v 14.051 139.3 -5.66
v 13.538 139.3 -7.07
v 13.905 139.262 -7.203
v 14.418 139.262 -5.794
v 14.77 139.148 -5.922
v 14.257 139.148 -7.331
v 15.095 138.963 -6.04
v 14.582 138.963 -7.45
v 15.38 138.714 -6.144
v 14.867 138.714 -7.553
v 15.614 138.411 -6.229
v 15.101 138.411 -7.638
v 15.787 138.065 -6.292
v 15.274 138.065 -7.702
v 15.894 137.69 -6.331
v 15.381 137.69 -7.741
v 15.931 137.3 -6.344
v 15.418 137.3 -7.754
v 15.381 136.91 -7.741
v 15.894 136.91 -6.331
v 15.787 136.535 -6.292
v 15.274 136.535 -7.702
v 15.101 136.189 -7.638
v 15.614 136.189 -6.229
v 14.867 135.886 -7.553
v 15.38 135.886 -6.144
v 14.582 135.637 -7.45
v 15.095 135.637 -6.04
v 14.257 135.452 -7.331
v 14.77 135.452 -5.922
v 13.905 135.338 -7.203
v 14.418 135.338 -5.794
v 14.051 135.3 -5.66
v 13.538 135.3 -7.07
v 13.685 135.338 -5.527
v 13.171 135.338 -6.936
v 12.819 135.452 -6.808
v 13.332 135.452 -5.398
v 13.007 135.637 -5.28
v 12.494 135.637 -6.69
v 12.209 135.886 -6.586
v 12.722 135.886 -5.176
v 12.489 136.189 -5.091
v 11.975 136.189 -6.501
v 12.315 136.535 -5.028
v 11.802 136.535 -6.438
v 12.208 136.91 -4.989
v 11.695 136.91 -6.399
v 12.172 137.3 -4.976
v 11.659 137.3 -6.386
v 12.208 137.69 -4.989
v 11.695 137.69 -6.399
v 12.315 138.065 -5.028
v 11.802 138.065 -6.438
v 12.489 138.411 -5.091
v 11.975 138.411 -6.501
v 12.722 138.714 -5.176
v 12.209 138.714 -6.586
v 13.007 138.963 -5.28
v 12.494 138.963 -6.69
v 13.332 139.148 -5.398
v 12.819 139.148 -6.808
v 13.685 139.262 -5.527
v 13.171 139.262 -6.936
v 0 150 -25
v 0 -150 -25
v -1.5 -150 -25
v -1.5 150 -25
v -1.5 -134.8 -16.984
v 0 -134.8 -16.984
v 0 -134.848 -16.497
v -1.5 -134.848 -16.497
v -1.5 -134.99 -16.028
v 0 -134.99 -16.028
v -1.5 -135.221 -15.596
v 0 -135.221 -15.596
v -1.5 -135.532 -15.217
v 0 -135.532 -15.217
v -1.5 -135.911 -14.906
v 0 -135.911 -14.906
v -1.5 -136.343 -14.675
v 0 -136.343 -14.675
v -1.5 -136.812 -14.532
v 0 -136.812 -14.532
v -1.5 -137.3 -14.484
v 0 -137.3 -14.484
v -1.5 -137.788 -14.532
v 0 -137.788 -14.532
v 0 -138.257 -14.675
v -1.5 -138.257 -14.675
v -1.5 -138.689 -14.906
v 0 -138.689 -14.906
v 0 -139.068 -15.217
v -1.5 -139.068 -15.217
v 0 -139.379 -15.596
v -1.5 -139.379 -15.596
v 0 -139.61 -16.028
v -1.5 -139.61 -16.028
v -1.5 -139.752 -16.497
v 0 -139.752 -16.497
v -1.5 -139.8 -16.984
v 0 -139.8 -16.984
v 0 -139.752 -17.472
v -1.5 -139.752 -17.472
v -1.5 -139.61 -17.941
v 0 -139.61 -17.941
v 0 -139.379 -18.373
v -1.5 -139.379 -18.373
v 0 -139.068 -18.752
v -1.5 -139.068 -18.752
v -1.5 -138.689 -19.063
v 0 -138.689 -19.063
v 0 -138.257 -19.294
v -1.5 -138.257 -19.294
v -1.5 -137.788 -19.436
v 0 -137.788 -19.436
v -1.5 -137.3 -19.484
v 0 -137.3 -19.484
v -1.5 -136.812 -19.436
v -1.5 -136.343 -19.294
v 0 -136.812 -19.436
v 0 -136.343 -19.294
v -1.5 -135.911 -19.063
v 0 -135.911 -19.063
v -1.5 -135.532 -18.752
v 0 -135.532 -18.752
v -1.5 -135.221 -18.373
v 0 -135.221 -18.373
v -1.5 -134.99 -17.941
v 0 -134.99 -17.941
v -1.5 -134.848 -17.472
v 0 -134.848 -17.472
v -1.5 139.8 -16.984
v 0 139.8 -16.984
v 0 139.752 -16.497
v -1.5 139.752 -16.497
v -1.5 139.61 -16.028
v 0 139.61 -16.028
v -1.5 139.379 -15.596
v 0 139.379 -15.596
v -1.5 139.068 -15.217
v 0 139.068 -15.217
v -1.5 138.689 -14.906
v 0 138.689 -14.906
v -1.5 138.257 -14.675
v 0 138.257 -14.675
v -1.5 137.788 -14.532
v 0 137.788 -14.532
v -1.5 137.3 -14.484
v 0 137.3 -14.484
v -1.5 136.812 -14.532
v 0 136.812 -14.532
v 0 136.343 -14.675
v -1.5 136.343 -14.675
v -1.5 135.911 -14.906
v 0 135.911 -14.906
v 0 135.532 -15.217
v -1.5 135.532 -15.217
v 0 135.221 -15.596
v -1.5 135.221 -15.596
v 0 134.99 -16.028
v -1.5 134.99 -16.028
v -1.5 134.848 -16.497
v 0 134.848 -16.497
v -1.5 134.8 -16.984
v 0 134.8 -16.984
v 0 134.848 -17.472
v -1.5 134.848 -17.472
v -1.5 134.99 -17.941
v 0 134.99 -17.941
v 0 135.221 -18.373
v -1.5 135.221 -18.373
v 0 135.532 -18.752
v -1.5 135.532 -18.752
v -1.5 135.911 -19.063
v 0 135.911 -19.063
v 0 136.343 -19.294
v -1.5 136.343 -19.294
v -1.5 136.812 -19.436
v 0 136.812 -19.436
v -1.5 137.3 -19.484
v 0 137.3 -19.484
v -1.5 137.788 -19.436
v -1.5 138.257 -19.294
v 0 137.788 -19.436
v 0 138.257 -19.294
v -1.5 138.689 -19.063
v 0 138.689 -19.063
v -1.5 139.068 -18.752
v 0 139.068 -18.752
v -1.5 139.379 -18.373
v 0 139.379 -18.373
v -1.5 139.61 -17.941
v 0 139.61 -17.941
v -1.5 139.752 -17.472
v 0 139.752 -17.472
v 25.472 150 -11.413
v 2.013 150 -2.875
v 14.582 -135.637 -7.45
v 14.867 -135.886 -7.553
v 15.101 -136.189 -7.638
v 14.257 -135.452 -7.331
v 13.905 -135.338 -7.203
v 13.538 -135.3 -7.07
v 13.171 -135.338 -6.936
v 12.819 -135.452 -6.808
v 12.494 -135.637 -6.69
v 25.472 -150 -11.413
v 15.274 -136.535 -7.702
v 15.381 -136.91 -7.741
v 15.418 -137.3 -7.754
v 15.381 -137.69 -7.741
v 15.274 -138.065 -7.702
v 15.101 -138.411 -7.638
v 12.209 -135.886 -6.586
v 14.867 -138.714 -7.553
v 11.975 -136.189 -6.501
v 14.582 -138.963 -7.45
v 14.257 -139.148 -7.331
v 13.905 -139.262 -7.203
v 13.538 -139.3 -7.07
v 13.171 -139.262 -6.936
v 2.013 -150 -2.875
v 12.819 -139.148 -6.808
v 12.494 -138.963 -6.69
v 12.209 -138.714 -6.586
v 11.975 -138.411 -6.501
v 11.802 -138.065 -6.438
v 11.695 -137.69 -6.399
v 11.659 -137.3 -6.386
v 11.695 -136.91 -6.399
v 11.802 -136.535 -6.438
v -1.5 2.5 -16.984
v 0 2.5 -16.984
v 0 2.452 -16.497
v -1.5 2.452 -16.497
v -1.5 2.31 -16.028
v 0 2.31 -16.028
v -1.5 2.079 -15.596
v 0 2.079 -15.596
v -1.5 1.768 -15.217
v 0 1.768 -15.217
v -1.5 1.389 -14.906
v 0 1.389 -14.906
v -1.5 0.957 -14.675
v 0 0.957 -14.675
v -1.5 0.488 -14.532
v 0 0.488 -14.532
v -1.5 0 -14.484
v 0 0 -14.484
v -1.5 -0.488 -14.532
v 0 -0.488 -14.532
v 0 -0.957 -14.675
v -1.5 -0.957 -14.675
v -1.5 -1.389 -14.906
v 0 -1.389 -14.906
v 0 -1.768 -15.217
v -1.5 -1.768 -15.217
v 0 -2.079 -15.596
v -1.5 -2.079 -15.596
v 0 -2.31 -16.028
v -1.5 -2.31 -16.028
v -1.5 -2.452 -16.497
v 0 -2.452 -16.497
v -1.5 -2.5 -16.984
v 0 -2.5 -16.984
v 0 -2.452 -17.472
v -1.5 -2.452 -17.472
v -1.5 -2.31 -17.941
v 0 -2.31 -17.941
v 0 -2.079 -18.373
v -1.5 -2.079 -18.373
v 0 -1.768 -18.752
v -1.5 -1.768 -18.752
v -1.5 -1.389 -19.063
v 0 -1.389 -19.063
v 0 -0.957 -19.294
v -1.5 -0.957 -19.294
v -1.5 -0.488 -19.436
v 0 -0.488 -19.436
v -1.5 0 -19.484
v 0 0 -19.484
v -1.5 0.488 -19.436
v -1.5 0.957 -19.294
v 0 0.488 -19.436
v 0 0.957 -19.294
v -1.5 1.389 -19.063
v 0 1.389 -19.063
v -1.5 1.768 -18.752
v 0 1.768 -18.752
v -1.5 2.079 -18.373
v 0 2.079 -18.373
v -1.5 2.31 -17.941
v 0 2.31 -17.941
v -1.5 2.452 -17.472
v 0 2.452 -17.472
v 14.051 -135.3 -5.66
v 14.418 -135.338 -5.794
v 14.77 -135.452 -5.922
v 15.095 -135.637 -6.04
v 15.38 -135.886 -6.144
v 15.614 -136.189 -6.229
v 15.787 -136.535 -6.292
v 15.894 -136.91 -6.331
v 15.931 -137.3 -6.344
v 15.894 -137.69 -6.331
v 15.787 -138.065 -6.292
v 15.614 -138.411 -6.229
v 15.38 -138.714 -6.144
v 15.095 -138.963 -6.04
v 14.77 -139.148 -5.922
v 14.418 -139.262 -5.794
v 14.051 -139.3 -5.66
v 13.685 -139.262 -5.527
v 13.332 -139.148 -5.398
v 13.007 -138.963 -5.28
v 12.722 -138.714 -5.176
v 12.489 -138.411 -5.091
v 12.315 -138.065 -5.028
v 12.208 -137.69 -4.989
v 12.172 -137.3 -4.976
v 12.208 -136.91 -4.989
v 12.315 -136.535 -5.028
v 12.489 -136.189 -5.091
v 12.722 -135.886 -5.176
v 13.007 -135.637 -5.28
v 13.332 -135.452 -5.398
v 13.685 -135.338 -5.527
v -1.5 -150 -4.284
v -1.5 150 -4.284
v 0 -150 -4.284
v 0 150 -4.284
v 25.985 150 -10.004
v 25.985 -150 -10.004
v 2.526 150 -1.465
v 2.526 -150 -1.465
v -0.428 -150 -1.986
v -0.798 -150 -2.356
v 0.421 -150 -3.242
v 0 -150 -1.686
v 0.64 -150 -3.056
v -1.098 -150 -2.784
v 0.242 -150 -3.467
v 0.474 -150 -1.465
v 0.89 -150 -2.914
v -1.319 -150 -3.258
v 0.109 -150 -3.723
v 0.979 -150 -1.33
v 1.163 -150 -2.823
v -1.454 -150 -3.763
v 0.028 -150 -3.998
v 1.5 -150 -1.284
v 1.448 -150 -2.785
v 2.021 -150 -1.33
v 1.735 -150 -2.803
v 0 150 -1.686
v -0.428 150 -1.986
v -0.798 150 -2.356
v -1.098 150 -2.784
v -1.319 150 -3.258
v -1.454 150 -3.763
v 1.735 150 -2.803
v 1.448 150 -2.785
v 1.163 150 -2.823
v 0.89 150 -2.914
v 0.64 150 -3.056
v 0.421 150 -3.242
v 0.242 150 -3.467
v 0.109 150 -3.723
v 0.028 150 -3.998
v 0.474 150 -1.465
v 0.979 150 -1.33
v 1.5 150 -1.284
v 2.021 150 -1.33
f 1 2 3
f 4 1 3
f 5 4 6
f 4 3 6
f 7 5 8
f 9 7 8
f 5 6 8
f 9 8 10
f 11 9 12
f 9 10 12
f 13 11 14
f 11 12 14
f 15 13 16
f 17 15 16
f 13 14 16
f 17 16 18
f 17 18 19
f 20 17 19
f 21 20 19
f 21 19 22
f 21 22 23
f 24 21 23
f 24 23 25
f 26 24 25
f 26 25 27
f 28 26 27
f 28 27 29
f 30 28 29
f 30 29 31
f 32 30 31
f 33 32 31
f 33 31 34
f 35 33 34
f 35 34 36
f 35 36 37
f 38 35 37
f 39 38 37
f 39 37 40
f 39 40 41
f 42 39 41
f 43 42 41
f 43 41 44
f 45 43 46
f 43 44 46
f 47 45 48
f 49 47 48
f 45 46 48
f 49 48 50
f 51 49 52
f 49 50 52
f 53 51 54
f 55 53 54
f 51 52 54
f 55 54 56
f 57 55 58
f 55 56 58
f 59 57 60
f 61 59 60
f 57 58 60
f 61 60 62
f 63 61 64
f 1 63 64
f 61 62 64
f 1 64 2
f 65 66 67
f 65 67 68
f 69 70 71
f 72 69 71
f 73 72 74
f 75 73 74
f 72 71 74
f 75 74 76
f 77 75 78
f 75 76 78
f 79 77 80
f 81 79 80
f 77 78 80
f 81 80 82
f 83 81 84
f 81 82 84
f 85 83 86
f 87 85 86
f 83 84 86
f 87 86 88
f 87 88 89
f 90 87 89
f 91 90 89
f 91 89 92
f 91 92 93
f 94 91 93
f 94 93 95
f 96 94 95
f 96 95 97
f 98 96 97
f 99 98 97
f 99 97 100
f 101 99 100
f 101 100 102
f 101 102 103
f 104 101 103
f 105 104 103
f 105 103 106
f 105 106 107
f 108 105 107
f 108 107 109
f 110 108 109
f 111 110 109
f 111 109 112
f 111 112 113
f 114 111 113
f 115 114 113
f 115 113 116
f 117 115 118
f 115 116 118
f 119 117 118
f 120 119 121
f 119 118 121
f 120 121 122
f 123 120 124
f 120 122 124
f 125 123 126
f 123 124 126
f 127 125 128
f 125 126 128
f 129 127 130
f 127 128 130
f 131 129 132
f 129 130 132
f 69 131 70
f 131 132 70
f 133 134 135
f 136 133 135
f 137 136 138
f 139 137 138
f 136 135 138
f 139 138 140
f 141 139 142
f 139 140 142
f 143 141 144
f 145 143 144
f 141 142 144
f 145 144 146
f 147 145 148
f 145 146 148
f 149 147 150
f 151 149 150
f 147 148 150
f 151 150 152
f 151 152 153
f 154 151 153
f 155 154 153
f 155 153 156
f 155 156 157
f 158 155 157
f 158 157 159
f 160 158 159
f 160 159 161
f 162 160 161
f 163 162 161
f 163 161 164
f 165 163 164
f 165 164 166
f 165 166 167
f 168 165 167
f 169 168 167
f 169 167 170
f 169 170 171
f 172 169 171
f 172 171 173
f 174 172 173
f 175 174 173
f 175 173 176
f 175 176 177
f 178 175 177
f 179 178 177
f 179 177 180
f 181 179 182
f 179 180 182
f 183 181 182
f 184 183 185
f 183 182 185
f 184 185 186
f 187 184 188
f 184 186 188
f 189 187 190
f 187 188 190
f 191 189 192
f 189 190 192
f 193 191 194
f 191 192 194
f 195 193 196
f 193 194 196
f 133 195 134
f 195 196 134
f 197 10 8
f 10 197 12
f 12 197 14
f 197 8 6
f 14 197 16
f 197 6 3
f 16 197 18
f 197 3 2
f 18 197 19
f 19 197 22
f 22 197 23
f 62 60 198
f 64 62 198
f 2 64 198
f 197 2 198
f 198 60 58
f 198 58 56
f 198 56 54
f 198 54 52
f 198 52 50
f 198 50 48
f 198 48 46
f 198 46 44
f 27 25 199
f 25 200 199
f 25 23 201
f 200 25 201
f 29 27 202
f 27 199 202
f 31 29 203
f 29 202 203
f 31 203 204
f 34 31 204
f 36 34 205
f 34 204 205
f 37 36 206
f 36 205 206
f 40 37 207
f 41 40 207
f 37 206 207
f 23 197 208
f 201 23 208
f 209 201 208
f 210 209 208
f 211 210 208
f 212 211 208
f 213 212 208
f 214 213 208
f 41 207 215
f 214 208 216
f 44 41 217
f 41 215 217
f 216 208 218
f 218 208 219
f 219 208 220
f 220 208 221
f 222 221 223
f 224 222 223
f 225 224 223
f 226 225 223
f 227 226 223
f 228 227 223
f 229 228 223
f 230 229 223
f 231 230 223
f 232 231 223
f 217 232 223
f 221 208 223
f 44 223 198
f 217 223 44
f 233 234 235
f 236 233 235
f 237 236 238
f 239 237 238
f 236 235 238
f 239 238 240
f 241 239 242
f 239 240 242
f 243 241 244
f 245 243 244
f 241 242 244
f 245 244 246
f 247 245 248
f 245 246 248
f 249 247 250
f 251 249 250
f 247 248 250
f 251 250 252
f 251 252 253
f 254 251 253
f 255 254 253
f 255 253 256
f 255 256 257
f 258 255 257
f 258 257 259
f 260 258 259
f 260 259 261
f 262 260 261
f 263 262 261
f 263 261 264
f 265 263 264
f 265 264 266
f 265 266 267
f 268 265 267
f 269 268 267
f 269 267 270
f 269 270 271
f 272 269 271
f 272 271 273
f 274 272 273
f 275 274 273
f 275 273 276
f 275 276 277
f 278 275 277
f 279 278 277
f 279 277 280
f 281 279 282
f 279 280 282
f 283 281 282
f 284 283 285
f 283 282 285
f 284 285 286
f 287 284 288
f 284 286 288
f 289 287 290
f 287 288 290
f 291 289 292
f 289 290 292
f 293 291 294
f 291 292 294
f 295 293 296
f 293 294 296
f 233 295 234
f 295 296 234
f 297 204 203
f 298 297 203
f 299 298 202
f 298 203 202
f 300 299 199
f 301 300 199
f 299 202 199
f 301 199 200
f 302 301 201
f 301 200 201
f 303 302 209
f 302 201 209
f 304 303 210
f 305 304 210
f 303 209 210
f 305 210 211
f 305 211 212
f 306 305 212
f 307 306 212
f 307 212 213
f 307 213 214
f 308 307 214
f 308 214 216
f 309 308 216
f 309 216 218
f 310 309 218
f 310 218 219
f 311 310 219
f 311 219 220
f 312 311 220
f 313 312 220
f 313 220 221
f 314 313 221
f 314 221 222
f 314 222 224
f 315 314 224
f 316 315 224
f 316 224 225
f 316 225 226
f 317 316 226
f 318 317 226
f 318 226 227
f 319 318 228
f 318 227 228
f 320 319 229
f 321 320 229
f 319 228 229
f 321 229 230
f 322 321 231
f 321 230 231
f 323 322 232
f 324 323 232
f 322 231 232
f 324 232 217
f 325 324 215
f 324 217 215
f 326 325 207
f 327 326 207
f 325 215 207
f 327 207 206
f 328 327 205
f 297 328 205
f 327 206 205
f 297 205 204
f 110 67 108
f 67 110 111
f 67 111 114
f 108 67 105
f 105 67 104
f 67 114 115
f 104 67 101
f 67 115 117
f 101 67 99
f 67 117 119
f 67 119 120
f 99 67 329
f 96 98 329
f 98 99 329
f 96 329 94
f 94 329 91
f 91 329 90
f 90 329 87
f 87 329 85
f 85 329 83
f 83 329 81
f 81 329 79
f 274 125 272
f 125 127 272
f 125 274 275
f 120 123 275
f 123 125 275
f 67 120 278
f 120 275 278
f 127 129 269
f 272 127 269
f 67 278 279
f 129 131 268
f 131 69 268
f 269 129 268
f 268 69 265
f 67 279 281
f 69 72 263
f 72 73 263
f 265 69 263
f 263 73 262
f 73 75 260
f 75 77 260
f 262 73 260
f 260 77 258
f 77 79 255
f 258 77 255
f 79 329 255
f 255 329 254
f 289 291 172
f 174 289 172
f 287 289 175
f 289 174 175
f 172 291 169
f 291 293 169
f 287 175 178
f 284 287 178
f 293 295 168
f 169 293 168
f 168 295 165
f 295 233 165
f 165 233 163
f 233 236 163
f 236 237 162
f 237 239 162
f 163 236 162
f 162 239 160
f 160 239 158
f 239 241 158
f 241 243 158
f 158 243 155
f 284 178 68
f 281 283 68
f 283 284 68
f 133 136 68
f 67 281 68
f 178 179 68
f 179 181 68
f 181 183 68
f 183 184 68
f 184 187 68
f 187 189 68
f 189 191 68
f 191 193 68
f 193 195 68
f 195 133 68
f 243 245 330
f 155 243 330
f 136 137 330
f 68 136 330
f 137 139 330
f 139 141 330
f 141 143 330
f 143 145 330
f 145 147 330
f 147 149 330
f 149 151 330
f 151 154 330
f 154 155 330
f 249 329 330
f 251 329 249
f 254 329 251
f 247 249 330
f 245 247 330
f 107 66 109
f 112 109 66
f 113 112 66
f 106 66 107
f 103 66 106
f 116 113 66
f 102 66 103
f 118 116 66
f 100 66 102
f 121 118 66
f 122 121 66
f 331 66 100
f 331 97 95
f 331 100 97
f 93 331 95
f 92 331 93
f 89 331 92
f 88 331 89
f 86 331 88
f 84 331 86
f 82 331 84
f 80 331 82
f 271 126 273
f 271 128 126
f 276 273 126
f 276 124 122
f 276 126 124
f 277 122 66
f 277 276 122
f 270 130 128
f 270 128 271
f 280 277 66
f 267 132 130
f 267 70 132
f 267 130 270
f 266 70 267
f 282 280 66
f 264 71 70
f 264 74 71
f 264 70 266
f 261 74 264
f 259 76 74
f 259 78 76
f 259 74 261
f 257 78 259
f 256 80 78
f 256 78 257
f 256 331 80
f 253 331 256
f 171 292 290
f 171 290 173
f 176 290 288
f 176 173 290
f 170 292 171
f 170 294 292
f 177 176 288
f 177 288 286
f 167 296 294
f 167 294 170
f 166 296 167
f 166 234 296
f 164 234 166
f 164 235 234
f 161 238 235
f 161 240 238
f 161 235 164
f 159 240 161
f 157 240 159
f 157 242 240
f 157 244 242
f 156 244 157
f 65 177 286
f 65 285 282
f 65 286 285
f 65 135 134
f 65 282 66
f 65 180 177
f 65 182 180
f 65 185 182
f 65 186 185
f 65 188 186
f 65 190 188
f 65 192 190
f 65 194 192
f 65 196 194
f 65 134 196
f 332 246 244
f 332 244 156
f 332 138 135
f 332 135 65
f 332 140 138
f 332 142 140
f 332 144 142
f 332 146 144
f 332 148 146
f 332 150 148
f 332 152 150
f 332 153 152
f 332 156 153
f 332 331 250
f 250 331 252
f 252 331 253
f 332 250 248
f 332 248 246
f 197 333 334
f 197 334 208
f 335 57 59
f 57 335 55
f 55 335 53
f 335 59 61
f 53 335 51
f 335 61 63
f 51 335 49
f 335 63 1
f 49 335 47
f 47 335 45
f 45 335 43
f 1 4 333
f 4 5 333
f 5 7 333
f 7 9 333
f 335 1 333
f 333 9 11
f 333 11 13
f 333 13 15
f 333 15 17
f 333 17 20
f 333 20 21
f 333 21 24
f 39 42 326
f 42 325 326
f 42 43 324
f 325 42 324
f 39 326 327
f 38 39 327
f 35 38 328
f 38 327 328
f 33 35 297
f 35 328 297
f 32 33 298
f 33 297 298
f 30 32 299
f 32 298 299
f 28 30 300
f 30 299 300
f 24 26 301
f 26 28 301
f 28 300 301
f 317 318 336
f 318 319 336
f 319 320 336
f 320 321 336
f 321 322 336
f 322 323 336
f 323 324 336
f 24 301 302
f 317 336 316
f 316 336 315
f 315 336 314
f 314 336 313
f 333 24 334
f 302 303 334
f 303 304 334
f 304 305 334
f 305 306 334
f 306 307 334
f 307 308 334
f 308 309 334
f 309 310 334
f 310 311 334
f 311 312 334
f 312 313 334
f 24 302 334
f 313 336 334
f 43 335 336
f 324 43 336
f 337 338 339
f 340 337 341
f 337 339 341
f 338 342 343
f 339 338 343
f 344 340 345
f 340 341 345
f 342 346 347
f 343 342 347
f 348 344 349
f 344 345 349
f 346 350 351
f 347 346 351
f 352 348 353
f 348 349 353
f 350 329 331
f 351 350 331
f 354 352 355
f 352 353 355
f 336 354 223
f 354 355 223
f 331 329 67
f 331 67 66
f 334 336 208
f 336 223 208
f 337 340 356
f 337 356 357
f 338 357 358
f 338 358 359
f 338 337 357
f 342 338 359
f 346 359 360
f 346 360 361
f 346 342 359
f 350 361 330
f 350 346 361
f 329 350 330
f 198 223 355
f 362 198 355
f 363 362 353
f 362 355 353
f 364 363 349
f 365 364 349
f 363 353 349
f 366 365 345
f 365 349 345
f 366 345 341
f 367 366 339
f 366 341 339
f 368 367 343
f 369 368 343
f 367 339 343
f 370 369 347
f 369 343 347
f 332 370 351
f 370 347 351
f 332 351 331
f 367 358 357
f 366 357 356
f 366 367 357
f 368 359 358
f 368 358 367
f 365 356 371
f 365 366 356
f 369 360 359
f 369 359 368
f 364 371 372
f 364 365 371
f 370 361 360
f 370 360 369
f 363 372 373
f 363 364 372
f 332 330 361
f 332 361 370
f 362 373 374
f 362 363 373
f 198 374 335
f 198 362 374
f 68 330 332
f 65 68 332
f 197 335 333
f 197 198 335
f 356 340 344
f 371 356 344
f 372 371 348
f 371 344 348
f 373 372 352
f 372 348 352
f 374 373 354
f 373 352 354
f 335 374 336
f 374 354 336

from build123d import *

# Parameters (mm, degrees)
SKETCH1_W                = 300
SKETCH1_H                = 50
BASE_FLANGE1_DEPTH       = 1.5
SKETCHED_START           = -150
SKETCHED_BEND1_DEPTH     = 300
SKETCHED_BEND1_2_DEPTH   = 300
F_4_0_4_DIAMETER_HOLE1_D = 4
F_5_0_5_DIAMETER_HOLE1_D = 5


# Read off the part's stored shape, not the designer's step: Sketched Bend1
# Sheet-metal steps are written as plain solids
with BuildPart() as part:
    # Sketch1 → Base-Flange1 (new body)
    with BuildSketch(Plane.YZ):
        Rectangle(SKETCH1_W, SKETCH1_H)
    extrude(amount=-BASE_FLANGE1_DEPTH)

    # Sketched Bend1 outline → Sketched Bend1 (cut)
    with BuildSketch(Plane(origin=(0, 0, 0), x_dir=(1, 0, 0), z_dir=(0, 1, 0)).offset(SKETCHED_START)):
        with BuildLine():
            Line((0, -25), (0, 1.686367809))
            ThreePointArc((0, 1.686367809), (-1.098076211, 2.78444402), (-1.5, 4.28444402))
            Line((-1.5, 4.28444402), (-1.5, -25))
            Line((-1.5, -25), (0, -25))
        make_face()
    extrude(amount=SKETCHED_BEND1_DEPTH, mode=Mode.SUBTRACT)

    # Sketched Bend1 2 outline → Sketched Bend1 2 (add)
    with BuildSketch(Plane(origin=(0, 0, 0), x_dir=(1, 0, 0), z_dir=(0, 1, 0)).offset(SKETCHED_START)):
        with BuildLine():
            Line((25.472225443, 11.413353872), (2.013030215, 2.874905089))
            ThreePointArc((2.013030215, 2.874905089), (0.639635346, 3.055715954), (0, 4.28444402))
            Line((0, 4.28444402), (0, 1.686367809))
            ThreePointArc((0, 1.686367809), (1.238532772, 1.295859926), (2.52606043, 1.465366158))
            Line((2.52606043, 1.465366158), (25.985255658, 10.003814941))
            Line((25.985255658, 10.003814941), (25.472225443, 11.413353872))
        make_face()
    extrude(amount=SKETCHED_BEND1_2_DEPTH)

    # Ø4.0 (4) Diameter Hole1 (through all)
    with Locations(Plane(origin=(-0.175466668, 0, -0.482090707), x_dir=(0, -1, 0), z_dir=(0.3420201433256727, 0, 0.9396926207859071))):
        with Locations((-137.3, 15.139659211), (137.3, 15.139659211)):
            Hole(F_4_0_4_DIAMETER_HOLE1_D / 2)

    # Ø5.0 (5) Diameter Hole1 (through all)
    with Locations(Plane(origin=(-1.5, 0, 0), x_dir=(0, -1, 0), z_dir=(-1, 0, 0))):
        with Locations((-137.3, -16.98444402), (137.3, -16.98444402), (0, -16.98444402)):
            Hole(F_5_0_5_DIAMETER_HOLE1_D / 2)


solid = part.part
